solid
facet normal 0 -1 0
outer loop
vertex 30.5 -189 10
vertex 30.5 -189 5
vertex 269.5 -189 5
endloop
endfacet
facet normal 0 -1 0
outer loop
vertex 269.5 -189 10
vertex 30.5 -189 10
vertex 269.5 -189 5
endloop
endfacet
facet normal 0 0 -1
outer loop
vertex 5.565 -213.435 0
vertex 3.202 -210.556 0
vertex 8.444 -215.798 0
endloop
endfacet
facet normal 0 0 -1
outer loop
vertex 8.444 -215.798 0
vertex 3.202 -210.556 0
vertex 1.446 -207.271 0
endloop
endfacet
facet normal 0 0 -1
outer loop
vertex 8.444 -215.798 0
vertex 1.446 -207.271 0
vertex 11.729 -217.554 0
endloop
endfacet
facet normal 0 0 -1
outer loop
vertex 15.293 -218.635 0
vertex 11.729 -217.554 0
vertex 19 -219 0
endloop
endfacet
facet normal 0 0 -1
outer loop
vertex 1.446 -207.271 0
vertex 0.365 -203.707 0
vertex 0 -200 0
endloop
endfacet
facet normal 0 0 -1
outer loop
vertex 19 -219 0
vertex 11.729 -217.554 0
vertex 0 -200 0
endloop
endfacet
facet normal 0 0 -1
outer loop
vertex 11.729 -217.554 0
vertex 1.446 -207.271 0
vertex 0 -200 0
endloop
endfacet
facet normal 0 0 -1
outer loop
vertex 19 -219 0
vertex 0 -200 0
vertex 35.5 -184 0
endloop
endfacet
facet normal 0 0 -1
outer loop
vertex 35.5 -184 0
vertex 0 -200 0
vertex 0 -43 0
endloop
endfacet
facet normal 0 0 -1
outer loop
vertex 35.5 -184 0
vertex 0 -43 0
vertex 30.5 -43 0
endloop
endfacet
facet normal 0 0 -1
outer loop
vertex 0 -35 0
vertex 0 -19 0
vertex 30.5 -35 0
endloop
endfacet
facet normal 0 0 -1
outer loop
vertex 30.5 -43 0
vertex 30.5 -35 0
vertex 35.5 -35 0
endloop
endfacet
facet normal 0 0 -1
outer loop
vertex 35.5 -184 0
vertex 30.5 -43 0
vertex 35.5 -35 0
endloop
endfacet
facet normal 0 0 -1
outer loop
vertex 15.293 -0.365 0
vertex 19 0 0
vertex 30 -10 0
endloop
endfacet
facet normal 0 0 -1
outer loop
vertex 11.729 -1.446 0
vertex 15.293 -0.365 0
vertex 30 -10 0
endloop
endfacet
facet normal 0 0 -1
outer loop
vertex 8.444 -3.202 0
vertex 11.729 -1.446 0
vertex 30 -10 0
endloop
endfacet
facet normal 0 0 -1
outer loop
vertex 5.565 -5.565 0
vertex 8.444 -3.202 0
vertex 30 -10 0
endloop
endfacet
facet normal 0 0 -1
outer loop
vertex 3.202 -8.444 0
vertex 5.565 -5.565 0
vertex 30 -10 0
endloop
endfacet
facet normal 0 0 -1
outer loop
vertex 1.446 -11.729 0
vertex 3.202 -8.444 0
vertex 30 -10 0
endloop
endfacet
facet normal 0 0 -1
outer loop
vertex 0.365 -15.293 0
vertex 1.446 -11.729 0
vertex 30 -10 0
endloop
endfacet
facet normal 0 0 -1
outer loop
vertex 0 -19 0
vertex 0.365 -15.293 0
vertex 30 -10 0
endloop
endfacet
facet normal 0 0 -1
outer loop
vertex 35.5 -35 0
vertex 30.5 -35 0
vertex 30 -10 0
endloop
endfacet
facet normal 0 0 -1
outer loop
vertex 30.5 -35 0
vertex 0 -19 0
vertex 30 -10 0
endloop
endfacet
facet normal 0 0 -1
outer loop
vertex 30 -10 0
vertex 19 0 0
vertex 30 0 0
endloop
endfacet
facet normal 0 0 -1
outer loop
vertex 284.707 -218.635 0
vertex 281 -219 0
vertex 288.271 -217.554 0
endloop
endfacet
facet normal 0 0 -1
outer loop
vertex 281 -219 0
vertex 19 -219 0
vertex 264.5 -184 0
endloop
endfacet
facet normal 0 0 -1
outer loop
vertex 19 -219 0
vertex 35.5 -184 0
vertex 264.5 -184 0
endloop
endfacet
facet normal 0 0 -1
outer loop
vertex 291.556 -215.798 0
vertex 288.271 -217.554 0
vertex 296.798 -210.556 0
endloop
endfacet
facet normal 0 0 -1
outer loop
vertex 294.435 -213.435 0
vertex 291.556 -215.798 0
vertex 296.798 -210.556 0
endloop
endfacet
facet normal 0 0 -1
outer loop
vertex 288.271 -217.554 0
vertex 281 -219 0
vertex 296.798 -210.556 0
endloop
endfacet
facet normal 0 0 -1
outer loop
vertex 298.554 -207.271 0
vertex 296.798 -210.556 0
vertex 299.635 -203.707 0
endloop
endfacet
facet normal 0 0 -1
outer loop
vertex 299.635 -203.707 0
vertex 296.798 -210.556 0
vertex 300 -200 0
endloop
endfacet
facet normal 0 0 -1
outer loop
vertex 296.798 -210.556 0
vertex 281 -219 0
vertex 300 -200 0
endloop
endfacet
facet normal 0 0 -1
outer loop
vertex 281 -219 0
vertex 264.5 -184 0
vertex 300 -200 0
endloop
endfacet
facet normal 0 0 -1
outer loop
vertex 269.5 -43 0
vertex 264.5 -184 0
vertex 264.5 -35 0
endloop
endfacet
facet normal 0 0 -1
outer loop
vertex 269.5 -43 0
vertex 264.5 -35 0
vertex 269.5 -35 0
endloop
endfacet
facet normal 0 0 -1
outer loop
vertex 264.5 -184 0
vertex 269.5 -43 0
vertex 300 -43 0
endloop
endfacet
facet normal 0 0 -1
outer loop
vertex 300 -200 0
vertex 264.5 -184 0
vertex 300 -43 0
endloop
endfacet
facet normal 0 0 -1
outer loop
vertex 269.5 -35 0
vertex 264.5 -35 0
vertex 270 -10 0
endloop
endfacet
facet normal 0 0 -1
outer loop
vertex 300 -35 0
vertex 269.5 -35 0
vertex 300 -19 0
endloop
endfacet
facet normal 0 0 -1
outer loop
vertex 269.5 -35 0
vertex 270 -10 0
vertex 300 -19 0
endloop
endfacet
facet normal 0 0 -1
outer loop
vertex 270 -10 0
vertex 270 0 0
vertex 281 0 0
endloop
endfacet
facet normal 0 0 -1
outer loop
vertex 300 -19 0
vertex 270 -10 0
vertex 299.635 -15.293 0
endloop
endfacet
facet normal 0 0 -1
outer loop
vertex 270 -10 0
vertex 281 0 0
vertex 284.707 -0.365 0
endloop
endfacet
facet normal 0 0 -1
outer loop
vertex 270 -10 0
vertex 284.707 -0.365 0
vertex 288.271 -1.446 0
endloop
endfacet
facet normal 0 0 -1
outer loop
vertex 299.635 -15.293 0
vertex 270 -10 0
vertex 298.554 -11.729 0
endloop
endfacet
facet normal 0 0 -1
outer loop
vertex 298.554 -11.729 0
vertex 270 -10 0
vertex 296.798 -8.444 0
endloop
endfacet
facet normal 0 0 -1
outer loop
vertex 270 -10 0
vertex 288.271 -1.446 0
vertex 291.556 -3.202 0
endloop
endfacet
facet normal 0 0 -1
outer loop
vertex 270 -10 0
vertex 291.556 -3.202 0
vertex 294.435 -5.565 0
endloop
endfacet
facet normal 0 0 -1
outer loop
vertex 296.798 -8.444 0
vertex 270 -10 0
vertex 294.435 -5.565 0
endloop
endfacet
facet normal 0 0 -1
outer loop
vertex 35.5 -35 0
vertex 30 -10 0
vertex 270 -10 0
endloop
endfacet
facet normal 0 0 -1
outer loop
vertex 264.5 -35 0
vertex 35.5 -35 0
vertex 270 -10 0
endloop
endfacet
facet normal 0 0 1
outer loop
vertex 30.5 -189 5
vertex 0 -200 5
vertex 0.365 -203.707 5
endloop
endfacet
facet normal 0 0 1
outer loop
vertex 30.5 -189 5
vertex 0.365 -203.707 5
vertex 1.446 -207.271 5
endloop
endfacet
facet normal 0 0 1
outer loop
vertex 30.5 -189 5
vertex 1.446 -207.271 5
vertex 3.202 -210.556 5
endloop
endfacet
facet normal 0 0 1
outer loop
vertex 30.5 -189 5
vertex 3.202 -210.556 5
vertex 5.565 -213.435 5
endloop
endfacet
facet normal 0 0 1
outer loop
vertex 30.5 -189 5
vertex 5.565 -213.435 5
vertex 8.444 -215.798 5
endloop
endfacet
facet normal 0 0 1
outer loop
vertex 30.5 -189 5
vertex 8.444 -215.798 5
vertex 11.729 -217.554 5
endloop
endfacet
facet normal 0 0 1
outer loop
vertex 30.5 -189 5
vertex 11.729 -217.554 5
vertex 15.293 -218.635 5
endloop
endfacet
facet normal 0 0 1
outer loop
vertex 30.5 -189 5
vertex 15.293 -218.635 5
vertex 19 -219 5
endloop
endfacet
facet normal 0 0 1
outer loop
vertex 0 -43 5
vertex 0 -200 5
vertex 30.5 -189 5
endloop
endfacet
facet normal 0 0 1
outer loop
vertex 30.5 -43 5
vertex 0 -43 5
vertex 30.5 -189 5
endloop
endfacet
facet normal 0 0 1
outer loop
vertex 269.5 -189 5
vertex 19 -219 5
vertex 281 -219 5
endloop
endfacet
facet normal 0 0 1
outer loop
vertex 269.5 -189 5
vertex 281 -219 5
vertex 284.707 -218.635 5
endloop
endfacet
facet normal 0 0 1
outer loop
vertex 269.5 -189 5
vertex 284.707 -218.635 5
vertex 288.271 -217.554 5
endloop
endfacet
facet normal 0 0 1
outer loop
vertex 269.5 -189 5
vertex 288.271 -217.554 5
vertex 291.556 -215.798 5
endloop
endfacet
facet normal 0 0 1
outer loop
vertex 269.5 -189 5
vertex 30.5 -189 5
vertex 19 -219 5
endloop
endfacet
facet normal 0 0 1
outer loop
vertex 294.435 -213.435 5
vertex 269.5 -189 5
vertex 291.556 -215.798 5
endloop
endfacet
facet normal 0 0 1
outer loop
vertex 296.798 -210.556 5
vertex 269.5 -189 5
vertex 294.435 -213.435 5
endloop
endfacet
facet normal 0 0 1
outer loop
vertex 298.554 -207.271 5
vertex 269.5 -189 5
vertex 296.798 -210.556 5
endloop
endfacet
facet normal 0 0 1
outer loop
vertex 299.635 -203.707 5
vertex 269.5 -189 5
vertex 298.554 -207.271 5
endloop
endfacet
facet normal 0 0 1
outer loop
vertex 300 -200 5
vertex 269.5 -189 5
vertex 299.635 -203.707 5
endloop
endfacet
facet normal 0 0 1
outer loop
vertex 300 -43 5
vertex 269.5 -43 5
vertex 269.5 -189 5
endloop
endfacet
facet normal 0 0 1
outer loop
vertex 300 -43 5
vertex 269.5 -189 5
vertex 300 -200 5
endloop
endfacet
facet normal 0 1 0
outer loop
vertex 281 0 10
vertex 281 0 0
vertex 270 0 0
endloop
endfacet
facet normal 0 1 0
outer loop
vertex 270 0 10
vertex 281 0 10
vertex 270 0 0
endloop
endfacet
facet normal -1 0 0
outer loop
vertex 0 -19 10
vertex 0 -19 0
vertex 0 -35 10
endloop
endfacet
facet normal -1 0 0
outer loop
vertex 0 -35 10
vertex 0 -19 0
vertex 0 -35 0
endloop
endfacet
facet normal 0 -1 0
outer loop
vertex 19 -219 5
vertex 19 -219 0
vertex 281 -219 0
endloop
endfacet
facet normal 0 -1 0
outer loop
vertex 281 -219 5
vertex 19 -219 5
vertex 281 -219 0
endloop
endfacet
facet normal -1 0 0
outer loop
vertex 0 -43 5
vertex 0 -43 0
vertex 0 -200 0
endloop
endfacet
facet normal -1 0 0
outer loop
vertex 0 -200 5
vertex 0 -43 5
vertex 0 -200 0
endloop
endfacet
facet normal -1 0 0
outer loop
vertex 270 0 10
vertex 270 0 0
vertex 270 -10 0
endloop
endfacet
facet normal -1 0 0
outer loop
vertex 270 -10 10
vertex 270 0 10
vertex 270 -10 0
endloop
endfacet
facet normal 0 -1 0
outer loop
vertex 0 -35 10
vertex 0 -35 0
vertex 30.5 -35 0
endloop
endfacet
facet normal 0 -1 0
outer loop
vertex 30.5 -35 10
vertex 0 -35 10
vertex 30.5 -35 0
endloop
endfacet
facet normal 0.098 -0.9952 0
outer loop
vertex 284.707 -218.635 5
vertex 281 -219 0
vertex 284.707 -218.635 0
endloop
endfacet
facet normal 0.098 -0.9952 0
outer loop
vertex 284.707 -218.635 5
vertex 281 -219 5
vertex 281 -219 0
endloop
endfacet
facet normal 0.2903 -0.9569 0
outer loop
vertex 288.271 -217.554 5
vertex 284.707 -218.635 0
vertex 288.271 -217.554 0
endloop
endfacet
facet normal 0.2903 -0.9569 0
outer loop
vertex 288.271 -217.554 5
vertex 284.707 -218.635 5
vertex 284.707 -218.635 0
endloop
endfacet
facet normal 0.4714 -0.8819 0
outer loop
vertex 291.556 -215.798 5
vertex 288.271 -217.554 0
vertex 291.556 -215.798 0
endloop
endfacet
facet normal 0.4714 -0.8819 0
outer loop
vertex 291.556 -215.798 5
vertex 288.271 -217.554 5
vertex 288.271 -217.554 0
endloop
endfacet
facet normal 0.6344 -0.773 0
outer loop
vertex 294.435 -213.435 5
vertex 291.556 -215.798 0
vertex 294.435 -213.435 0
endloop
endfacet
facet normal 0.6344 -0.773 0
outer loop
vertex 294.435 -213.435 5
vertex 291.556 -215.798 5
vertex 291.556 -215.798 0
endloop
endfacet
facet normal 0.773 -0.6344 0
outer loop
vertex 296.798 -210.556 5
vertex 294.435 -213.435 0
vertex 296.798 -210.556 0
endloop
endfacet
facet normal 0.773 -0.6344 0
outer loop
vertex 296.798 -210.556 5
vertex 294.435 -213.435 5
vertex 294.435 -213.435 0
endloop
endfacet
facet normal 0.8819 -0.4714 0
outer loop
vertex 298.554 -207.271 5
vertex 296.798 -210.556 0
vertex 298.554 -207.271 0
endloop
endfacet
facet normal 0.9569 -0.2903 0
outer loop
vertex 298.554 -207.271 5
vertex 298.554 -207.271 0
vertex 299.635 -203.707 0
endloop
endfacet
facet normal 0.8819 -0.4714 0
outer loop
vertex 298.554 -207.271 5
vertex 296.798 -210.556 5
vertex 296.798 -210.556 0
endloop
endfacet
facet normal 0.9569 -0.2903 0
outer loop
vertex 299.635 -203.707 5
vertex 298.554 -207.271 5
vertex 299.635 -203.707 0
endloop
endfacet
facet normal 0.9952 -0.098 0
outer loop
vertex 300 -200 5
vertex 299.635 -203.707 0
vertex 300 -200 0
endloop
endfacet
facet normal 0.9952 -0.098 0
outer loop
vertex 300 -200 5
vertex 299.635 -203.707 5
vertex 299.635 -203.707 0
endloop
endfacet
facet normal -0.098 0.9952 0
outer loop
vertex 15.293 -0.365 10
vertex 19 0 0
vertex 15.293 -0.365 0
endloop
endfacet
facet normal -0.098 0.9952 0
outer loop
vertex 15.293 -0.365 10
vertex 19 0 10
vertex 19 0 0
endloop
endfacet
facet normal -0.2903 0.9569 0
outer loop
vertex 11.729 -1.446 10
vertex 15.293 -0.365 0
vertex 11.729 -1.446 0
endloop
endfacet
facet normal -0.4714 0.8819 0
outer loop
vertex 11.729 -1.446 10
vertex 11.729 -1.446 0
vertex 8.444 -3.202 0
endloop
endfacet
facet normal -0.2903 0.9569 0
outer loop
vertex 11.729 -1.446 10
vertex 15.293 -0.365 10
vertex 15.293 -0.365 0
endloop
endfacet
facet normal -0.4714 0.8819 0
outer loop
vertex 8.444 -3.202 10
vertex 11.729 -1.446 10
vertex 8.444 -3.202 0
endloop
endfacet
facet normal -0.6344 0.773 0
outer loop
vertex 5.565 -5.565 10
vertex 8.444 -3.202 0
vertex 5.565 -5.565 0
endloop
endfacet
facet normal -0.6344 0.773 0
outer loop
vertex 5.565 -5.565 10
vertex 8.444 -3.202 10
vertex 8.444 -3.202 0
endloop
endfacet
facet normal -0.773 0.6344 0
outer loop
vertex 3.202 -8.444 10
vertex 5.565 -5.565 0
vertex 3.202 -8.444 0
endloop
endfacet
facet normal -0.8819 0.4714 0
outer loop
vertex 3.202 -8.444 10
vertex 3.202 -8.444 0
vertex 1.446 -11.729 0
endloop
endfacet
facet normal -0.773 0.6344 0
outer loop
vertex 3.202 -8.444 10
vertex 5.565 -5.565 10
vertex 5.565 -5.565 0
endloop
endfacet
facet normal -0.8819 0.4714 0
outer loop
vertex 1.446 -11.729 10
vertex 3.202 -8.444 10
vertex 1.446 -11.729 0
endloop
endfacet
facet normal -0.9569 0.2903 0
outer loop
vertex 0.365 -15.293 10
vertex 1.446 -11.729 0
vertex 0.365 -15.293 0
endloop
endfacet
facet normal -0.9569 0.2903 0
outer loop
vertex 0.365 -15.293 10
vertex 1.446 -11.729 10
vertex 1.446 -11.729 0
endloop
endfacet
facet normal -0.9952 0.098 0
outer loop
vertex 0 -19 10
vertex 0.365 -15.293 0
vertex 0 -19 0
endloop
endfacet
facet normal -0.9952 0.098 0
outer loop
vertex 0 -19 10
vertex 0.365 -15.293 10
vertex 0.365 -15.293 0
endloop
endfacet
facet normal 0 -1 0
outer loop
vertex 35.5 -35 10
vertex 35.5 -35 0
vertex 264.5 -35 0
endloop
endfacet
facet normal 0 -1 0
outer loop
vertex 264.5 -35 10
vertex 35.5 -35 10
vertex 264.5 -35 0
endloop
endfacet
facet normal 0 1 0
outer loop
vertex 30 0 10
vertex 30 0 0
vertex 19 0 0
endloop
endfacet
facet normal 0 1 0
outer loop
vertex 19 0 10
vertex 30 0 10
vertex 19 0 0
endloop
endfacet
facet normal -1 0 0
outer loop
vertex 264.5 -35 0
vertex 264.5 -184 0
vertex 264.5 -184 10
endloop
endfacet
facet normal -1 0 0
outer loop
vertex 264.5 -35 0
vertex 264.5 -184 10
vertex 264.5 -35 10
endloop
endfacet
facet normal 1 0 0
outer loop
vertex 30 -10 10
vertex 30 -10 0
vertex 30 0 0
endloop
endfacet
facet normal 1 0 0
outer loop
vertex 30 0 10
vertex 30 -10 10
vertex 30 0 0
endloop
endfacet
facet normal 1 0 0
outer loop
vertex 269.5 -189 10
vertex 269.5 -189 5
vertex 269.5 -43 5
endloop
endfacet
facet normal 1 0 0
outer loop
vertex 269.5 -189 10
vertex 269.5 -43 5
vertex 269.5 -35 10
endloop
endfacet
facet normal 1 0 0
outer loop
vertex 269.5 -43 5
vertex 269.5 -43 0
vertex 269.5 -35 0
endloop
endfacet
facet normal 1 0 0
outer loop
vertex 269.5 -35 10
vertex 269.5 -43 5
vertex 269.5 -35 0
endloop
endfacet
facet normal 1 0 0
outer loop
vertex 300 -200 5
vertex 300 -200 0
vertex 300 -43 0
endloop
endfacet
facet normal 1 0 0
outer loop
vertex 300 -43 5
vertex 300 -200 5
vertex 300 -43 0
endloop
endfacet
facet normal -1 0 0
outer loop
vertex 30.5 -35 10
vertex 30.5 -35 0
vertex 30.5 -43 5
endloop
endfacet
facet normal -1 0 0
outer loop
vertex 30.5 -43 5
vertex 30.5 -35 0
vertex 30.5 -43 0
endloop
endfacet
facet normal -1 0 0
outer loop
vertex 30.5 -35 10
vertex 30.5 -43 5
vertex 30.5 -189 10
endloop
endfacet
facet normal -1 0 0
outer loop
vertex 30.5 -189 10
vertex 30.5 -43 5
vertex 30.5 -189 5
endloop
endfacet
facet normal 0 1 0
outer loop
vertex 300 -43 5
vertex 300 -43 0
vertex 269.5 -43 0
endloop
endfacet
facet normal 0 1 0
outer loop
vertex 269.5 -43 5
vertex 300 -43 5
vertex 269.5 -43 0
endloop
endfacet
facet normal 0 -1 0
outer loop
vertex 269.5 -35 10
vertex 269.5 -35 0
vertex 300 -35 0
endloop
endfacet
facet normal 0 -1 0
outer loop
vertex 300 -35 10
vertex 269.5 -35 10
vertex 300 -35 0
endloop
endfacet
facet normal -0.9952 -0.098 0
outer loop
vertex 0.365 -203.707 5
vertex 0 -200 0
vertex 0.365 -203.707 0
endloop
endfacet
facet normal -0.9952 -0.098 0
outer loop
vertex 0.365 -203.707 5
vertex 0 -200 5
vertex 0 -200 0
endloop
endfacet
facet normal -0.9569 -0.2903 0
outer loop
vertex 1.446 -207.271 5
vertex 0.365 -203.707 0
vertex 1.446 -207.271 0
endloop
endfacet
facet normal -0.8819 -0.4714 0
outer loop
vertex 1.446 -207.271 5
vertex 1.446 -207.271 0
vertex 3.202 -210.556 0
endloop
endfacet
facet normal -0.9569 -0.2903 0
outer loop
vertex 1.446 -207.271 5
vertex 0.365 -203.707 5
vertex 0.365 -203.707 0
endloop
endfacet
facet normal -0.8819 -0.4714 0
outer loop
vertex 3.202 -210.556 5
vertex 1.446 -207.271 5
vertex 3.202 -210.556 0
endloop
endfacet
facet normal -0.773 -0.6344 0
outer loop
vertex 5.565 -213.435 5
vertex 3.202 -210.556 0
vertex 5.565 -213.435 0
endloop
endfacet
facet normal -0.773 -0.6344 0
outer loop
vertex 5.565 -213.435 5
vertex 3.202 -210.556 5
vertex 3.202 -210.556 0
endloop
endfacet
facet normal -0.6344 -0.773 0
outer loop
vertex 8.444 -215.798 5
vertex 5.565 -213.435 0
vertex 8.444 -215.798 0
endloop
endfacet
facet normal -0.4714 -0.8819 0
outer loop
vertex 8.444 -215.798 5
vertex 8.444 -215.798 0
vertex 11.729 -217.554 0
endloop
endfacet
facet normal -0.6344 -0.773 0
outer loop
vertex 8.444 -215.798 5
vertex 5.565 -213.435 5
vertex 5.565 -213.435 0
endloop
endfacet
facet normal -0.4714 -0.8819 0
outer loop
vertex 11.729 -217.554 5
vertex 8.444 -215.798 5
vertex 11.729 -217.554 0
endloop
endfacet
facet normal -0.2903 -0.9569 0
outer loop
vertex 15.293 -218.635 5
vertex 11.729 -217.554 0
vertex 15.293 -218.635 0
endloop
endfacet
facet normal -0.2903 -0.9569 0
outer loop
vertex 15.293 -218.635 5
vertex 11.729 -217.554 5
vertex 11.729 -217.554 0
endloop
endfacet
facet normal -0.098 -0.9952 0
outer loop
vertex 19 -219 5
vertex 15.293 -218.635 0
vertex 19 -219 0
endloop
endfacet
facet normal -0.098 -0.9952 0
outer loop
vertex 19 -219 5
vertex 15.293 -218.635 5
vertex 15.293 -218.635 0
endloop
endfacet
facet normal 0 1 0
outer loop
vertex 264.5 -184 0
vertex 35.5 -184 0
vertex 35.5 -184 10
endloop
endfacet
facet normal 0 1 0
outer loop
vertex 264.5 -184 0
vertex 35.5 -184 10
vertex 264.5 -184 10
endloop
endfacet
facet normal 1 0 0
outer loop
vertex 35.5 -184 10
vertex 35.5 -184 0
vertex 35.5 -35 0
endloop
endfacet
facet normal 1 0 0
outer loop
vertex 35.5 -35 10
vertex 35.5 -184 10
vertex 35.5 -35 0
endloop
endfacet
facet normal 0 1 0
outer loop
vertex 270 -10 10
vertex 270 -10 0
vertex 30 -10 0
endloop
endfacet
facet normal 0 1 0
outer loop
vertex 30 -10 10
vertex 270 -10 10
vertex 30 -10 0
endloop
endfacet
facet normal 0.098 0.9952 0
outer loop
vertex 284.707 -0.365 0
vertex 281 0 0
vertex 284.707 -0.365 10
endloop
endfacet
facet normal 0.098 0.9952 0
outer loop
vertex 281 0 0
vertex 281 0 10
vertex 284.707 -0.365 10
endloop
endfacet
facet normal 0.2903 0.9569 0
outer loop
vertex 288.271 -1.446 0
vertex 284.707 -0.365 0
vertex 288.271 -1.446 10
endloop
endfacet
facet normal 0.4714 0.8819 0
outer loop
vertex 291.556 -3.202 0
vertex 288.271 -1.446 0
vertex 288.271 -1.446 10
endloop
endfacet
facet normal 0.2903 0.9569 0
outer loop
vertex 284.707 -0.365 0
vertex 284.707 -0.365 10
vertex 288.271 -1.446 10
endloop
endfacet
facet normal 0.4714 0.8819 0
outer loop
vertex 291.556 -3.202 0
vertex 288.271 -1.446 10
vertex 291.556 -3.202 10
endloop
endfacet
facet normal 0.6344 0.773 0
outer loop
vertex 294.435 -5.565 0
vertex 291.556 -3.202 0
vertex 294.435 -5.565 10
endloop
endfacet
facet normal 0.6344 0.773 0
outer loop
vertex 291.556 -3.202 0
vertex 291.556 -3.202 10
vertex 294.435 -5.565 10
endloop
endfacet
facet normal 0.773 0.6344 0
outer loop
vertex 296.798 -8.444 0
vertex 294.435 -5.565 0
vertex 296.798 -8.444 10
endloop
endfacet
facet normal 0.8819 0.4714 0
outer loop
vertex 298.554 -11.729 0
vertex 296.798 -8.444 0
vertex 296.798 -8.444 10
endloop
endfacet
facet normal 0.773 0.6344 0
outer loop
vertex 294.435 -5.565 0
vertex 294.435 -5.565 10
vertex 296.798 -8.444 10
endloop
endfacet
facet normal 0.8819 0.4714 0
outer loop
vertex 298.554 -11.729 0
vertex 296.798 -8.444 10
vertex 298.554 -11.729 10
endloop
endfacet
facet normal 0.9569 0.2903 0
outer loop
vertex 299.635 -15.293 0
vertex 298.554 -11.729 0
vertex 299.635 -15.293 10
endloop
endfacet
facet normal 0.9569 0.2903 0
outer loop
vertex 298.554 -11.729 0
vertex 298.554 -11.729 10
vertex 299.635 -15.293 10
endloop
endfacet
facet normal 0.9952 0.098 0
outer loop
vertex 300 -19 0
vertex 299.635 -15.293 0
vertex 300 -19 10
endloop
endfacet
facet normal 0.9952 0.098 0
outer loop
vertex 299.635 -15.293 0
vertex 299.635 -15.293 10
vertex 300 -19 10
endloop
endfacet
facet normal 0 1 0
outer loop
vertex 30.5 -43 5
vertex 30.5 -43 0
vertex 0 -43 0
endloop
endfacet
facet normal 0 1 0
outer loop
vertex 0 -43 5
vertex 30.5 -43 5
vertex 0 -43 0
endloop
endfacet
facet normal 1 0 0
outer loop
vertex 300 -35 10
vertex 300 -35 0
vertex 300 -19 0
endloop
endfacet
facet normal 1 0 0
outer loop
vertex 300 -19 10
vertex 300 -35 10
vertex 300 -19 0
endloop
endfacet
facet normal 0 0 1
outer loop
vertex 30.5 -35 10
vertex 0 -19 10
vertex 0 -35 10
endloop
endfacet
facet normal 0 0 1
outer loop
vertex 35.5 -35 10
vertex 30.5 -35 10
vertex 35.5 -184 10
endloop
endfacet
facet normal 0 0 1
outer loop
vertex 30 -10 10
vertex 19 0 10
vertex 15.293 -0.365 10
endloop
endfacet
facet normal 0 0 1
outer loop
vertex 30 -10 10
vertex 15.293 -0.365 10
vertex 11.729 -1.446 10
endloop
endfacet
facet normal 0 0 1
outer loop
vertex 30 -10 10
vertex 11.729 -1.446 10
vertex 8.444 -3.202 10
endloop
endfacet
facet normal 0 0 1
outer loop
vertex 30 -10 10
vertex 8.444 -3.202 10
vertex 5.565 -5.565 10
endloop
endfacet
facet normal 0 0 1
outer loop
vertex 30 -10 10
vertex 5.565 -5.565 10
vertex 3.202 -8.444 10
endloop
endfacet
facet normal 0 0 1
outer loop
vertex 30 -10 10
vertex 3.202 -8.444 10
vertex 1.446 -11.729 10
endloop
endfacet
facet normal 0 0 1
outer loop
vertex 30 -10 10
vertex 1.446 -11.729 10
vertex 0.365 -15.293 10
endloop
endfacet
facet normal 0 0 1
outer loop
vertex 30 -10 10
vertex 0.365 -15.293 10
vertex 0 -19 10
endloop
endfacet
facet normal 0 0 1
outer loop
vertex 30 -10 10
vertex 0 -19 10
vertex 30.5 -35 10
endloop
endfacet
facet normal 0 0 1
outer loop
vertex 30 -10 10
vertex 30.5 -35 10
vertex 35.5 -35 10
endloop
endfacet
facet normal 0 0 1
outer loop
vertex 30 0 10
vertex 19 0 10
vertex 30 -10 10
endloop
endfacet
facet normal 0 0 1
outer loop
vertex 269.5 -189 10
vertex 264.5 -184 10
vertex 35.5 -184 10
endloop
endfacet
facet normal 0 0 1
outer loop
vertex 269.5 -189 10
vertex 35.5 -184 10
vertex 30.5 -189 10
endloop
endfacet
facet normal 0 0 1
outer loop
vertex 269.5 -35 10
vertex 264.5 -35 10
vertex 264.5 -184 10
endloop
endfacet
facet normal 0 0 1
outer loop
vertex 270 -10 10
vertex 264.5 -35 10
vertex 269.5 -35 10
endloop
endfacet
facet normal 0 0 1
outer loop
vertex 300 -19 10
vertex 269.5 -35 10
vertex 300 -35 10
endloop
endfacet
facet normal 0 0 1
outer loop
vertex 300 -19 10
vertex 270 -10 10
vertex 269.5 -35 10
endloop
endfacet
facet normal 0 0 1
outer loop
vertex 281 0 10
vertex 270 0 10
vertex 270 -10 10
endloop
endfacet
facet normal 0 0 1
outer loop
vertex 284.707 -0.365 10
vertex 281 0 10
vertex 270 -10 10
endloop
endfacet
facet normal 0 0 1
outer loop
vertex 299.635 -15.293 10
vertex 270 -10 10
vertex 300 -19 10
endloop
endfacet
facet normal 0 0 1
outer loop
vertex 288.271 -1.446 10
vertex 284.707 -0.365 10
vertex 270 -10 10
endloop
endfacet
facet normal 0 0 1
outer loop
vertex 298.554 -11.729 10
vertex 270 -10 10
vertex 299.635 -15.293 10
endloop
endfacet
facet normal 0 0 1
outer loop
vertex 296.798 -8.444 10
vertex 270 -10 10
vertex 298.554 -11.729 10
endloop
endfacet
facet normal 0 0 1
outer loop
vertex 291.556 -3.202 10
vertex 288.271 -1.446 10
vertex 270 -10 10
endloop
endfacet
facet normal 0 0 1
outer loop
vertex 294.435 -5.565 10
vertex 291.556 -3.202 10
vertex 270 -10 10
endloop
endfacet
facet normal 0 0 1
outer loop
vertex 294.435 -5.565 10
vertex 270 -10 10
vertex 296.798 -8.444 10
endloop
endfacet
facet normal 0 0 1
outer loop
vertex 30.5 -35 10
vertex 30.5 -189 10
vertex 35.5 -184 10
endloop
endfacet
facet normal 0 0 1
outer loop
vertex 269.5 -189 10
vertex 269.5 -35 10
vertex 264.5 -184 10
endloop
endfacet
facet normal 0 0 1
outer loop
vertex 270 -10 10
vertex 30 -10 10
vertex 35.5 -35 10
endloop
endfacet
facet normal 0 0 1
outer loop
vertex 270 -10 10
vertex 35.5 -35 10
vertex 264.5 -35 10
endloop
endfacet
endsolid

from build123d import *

# Parameters (mm, degrees)
F0_W     = 229
F0_H     = 149
F1_DEPTH = 10
F2_DEPTH = 5
F3_R     = 19


with BuildPart() as f1:
    # F0 (on Top) → F1 (new body)
    with BuildSketch(Plane.XY):
        Polygon((30, 0), (0, 0), (0, -35), (30.5, -35), (30.5, -43), (30.5, -184), (30.5, -188.999996), (35.5, -188.999996), (264.5, -188.999996), (269.5, -188.999996), (269.5, -184), (269.5, -43), (269.5, -35), (300, -35), (300, 0), (270, 0), (270, -10), (150, -10), (30, -10), align=None)
        with Locations((150, -109.5)):
            Rectangle(F0_W, F0_H, mode=Mode.SUBTRACT)
    extrude(amount=F1_DEPTH)

    # F0 (on Top) → F2 (join)
    with BuildSketch(Plane.XY):
        Polygon((30.5, -43), (0, -43), (0, -219), (300, -219), (300, -43), (269.5, -43), (269.5, -184), (269.5, -188.999996), (264.5, -188.999996), (35.5, -188.999996), (30.5, -188.999996), (30.5, -184), align=None)
    extrude(amount=F2_DEPTH)

    # F3
    f3_edges = [f1.edges().sort_by_distance(p)[0] for p in [
        (0, 0, 5),
        (300, 0, 5),
        (300, -219, 2.5),
        (0, -219, 2.5),
    ]]
    fillet(f3_edges, radius=F3_R)


solid = f1.part
